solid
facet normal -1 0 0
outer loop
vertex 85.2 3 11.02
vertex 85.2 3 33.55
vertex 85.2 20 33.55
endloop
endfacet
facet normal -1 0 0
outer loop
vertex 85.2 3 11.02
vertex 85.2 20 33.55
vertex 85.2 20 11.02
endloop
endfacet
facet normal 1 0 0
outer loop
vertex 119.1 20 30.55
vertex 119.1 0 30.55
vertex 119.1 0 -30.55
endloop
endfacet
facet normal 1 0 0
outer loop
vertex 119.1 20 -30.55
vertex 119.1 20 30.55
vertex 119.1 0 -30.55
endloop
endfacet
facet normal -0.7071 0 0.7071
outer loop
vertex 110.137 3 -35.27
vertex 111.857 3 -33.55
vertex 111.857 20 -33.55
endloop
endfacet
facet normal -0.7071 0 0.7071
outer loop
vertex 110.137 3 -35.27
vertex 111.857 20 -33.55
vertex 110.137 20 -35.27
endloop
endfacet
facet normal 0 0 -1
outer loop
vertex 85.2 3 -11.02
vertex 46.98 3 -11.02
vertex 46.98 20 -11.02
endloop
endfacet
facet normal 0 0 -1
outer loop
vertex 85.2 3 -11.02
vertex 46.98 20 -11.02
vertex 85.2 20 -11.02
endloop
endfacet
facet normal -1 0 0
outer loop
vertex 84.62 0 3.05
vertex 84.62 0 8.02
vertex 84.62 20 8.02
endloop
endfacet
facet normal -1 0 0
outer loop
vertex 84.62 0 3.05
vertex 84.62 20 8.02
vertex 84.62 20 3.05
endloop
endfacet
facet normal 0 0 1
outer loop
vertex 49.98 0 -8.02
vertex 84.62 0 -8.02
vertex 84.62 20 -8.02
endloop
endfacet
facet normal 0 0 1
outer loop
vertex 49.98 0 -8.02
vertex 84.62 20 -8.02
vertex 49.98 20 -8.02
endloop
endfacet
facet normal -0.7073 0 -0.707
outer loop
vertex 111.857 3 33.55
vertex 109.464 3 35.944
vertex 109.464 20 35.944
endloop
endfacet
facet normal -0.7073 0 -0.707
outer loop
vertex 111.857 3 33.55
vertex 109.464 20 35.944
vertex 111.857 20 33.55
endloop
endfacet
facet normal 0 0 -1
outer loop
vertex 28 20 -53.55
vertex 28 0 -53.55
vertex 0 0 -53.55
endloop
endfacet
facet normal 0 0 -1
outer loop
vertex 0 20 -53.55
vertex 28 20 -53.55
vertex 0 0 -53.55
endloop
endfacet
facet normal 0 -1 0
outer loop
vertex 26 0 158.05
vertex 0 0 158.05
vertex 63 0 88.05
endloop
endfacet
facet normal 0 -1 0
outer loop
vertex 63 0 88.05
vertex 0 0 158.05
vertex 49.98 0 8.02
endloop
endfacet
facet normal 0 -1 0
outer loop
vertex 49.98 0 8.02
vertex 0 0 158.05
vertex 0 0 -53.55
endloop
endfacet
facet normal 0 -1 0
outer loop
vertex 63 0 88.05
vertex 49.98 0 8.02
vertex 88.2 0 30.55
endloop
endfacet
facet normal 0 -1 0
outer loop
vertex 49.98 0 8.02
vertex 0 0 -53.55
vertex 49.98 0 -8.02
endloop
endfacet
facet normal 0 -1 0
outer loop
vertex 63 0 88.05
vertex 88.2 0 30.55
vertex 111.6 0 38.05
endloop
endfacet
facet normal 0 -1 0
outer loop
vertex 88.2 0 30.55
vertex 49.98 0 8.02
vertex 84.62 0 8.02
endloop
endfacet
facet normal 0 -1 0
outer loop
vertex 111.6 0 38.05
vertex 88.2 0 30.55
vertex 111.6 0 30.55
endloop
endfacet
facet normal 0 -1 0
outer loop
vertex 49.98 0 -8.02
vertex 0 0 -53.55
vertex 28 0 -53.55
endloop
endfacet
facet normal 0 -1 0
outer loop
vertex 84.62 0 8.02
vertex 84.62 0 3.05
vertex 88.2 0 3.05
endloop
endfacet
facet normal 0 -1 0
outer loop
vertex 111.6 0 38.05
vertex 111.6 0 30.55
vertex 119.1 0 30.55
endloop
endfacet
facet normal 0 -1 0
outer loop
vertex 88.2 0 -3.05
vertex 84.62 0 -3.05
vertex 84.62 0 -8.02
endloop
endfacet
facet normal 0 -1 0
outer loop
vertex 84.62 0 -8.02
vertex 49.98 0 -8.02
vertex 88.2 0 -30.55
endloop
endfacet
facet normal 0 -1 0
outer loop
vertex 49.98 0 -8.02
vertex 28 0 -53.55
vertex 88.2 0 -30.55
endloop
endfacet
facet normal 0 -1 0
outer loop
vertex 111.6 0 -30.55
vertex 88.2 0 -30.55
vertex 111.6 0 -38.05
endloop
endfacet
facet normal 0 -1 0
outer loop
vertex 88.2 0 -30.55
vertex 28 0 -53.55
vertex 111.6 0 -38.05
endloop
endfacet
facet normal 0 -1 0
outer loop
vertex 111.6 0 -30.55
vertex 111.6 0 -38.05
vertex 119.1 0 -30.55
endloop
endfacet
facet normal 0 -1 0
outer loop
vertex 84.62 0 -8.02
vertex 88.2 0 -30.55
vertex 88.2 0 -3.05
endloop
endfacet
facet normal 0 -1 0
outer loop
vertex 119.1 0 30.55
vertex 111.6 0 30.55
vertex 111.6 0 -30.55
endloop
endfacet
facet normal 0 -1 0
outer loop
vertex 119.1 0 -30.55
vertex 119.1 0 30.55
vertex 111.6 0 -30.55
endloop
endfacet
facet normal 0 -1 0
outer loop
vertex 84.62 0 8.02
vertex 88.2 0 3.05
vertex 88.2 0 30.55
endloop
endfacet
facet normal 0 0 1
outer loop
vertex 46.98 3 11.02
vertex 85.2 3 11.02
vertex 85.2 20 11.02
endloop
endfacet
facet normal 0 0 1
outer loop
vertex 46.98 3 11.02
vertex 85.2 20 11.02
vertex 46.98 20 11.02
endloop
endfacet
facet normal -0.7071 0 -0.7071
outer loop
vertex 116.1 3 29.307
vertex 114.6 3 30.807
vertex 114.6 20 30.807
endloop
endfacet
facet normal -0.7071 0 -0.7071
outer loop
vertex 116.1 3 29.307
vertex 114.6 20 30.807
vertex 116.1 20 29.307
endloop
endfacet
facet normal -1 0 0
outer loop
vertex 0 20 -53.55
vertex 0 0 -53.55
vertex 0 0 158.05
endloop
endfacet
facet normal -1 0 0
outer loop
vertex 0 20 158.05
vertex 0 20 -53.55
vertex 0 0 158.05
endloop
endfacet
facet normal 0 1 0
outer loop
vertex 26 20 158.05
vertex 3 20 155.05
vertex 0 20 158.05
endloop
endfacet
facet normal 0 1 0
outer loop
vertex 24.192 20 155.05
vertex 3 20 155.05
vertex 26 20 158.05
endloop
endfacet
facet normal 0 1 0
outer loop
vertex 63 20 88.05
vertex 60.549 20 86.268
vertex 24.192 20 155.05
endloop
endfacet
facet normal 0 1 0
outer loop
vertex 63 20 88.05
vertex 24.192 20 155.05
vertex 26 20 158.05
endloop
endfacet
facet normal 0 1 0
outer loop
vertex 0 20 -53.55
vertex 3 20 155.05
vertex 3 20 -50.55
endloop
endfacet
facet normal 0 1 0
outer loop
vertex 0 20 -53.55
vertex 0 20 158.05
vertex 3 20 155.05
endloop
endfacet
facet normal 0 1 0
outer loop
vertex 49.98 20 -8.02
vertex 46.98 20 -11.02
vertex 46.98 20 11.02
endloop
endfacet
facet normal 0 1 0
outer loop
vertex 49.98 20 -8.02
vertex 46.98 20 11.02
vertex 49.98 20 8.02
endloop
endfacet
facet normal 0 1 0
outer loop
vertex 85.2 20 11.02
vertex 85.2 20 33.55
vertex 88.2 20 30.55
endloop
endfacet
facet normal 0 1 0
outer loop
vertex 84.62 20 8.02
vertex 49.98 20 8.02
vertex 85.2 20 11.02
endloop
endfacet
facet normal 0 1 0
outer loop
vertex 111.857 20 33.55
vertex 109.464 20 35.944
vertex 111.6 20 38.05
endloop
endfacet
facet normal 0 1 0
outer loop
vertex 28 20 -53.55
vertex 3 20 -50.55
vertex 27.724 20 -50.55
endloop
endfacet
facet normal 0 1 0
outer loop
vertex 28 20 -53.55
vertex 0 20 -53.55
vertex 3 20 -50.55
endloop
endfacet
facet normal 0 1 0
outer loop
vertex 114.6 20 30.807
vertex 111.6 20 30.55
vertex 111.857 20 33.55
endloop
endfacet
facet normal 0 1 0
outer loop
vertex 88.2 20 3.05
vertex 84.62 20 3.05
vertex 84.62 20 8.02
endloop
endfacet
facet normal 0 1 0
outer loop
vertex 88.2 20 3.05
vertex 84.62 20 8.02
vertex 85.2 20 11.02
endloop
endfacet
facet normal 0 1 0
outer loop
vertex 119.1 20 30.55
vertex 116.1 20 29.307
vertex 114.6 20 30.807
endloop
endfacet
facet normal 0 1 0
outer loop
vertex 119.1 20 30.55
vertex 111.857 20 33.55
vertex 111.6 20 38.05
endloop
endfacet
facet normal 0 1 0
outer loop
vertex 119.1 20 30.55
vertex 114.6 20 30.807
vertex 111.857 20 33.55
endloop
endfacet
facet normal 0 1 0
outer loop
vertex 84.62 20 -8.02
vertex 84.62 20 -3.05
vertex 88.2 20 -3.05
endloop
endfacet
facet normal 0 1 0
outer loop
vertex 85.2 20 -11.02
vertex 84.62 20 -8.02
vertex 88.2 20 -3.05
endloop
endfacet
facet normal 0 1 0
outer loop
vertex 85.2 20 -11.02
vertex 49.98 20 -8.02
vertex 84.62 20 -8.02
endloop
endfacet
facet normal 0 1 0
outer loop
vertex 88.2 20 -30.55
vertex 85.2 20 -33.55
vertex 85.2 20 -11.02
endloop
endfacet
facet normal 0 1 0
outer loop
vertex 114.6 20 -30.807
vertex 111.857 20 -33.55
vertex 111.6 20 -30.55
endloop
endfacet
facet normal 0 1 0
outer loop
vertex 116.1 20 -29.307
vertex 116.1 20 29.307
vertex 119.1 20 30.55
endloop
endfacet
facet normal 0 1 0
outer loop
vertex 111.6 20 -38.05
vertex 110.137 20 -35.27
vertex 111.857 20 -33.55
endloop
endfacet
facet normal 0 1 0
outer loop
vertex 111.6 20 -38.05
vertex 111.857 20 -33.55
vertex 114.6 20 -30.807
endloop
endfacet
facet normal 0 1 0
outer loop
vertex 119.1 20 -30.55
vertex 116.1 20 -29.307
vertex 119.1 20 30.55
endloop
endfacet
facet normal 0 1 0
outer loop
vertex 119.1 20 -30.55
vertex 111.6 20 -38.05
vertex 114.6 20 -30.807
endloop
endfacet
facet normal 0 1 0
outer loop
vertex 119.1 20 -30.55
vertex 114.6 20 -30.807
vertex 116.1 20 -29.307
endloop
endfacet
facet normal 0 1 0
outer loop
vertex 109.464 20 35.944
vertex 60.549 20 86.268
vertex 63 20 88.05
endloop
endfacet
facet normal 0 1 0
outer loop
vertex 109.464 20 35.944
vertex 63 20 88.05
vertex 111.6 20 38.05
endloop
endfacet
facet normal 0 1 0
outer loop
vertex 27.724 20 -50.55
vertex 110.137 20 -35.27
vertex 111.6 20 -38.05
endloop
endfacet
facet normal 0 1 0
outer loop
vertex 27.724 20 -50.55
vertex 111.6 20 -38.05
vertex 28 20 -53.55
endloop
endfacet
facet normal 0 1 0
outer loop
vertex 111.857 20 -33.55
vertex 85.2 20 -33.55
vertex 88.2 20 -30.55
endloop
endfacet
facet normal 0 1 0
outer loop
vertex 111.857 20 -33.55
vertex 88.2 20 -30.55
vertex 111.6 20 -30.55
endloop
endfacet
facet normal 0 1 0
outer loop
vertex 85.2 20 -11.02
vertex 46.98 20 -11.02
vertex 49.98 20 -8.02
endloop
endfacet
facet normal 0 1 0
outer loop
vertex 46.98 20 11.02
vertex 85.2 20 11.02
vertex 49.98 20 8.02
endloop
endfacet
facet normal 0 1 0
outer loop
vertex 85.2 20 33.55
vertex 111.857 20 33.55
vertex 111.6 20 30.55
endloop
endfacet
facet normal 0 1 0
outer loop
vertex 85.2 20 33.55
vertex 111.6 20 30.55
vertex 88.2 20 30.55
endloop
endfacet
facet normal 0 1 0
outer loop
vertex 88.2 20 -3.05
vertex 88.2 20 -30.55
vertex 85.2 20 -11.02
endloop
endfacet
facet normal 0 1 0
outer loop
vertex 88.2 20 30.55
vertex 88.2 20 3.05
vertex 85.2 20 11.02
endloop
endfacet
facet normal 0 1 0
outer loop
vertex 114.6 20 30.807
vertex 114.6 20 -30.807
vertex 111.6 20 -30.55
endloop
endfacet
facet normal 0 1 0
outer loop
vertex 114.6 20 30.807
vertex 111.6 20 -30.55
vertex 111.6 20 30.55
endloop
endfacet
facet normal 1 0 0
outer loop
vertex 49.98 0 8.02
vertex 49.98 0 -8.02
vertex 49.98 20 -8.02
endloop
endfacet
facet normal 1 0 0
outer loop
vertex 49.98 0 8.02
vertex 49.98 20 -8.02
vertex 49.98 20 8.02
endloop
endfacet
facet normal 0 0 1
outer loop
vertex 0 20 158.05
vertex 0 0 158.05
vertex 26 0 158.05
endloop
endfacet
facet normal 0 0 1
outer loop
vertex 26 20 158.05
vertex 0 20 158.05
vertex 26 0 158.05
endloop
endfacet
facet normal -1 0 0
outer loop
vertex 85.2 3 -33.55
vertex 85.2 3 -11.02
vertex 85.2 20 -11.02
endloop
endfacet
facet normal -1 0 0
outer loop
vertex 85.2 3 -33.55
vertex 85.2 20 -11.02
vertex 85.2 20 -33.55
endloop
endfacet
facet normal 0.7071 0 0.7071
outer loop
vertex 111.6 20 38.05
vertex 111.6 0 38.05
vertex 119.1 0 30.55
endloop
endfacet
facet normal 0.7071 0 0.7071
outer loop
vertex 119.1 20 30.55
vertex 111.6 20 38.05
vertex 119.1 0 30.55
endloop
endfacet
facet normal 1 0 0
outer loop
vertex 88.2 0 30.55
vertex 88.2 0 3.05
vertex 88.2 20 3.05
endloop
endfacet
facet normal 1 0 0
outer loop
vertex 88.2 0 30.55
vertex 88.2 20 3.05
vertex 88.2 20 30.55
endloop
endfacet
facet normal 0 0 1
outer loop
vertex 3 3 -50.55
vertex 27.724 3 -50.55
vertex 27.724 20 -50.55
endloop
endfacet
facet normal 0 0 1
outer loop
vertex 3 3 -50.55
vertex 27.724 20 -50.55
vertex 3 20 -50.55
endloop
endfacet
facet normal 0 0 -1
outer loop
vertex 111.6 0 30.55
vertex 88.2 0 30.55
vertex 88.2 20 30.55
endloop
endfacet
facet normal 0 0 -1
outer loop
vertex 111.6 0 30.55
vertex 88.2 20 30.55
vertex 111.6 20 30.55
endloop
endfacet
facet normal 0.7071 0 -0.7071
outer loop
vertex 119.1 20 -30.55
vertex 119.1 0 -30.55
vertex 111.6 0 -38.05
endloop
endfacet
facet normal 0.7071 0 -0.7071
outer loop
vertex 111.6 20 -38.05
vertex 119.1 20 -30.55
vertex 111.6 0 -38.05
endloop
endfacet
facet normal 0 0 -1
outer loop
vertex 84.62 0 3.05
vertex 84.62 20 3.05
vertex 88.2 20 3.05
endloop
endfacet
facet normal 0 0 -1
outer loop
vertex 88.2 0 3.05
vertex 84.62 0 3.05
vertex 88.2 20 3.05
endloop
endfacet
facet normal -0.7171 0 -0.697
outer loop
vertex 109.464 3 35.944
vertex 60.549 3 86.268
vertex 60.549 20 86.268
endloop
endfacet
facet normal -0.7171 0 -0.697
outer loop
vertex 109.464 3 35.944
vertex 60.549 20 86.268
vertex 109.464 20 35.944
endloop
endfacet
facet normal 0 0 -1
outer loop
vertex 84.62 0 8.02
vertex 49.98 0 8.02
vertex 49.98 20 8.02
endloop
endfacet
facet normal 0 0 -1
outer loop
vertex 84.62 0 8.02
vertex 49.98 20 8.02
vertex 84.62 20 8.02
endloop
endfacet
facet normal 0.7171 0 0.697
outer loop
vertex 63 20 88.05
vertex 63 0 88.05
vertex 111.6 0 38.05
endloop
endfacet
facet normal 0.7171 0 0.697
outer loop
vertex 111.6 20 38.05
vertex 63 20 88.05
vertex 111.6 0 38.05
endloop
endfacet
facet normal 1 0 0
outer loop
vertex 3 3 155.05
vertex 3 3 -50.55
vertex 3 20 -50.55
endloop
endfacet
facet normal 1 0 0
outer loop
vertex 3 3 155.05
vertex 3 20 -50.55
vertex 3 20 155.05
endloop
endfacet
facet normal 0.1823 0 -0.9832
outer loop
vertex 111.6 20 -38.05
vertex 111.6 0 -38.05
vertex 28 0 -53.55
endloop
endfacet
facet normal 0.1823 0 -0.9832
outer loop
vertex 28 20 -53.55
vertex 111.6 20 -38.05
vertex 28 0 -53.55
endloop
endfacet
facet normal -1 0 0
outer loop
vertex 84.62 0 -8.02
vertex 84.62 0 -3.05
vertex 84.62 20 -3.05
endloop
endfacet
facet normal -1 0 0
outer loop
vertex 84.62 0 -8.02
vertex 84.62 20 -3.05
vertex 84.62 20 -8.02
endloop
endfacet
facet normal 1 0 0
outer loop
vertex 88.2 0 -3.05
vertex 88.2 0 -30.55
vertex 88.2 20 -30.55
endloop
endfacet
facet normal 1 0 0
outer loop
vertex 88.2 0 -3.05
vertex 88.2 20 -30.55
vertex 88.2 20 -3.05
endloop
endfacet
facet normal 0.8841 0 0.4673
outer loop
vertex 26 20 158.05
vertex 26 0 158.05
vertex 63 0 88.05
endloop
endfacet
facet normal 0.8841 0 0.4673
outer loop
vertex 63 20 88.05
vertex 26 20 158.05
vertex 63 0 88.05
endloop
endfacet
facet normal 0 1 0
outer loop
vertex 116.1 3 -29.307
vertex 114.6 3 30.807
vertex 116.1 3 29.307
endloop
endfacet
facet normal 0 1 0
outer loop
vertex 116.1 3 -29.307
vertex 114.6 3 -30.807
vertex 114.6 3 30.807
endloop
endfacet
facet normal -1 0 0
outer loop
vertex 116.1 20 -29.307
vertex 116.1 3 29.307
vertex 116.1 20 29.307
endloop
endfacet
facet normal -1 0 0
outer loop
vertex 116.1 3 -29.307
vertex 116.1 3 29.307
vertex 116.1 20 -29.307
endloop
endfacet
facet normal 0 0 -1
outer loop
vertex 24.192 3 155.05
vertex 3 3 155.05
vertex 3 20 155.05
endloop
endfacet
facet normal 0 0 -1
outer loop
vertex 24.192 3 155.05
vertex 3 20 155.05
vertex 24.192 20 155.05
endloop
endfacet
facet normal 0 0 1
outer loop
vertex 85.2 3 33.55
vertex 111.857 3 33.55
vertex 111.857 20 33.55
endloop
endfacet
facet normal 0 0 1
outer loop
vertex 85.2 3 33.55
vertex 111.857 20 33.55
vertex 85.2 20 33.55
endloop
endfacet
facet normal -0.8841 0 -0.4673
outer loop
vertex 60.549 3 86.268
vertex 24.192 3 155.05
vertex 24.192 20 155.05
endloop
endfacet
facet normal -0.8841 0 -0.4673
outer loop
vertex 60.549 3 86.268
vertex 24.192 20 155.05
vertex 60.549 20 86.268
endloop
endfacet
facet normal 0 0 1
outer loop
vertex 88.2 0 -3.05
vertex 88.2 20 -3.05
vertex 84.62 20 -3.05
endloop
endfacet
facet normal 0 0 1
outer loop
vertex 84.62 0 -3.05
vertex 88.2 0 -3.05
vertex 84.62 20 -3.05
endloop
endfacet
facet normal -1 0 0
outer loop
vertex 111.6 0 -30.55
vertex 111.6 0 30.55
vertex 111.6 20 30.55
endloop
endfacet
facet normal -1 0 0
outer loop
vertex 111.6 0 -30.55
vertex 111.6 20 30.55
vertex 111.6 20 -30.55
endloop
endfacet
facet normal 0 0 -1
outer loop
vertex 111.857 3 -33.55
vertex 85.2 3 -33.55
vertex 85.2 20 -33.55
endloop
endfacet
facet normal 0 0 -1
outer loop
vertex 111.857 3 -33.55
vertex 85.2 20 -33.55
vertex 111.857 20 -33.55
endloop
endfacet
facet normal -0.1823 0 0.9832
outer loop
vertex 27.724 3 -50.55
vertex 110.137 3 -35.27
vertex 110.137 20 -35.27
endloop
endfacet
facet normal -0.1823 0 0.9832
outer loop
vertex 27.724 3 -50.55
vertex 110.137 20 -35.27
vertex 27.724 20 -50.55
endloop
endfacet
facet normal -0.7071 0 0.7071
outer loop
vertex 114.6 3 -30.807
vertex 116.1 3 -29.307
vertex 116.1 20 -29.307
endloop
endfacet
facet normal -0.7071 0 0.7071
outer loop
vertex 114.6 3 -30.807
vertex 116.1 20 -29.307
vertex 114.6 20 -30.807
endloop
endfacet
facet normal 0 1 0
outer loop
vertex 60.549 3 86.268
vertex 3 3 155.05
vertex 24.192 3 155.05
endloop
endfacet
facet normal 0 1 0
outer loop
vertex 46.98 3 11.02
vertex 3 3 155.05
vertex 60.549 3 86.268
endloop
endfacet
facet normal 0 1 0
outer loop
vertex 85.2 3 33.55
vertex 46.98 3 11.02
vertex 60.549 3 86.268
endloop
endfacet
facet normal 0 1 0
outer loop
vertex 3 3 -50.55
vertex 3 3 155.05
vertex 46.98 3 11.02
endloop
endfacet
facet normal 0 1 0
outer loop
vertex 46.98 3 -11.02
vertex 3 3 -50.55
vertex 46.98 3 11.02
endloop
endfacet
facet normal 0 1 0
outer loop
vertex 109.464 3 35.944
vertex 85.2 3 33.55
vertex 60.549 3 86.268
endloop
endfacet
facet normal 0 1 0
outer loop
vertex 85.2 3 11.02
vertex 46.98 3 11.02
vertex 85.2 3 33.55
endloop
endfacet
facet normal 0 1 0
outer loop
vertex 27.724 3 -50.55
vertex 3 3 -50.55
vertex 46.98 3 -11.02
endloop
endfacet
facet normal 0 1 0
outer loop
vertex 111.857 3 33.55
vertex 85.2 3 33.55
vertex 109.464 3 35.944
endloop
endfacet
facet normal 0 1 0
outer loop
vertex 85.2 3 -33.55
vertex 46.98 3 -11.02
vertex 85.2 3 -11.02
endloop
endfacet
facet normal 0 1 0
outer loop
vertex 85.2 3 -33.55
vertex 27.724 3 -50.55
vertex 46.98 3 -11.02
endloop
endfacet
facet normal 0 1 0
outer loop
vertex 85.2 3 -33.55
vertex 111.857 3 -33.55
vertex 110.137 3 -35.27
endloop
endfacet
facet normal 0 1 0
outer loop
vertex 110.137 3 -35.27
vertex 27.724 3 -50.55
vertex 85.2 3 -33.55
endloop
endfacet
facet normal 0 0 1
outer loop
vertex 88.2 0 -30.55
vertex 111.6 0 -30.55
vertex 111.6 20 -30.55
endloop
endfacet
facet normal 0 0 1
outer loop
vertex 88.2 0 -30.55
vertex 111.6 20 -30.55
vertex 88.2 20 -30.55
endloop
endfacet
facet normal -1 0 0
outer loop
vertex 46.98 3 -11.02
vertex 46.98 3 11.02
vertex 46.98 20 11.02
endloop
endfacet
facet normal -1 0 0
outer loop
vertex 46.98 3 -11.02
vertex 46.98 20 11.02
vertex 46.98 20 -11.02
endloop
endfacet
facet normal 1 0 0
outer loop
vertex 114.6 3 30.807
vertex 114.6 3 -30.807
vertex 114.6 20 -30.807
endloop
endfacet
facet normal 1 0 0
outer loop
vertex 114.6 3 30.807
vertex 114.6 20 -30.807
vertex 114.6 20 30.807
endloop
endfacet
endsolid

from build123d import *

# Parameters (mm, degrees)
BOSS_EXTRUDE2_DEPTH = 20
SHELL1_START        = 3
SHELL1_DEPTH        = 17


# Read off the part's stored shape, not the designer's step: Shell1
with BuildPart() as part:
    # Sketch1 → Boss-Extrude2 (new body)
    with BuildSketch(Plane(origin=(0, 0, 0), x_dir=(1, 0, 0), z_dir=(0, 1, 0))):
        Polygon((111.6, 38.05), (28, 53.55), (0, 53.55), (0, -158.05), (26, -158.05), (63, -88.05), (111.6, -38.05), (119.1, -30.55), (119.1, 30.55), align=None)
        Polygon((84.62, 3.05), (84.62, 8.02), (49.98, 8.02), (49.98, -8.02), (84.62, -8.02), (84.62, -3.05), (88.2, -3.05), (88.2, -30.55), (111.6, -30.55), (111.6, 30.55), (88.2, 30.55), (88.2, 3.05), align=None, mode=Mode.SUBTRACT)
    extrude(amount=BOSS_EXTRUDE2_DEPTH)

    # Shell1 outline → Shell1 (cut)
    with BuildSketch(Plane(origin=(0, 0, 0), x_dir=(1, 0, 0), z_dir=(0, 1, 0)).offset(SHELL1_START)):
        Polygon((114.6, -30.807359313), (116.1, -29.307359313), (116.1, 29.307359313), (114.6, 30.807359313), align=None)
        Polygon((109.463620332, -35.943738981), (111.857359313, -33.55), (85.2, -33.55), (85.2, -11.02), (46.98, -11.02), (46.98, 11.02), (85.2, 11.02), (85.2, 33.55), (111.857359313, 33.55), (110.13729107, 35.270068243), (27.724239787, 50.55), (3, 50.55), (3, -155.05), (24.192413563, -155.05), (60.548822095, -86.26760548), align=None)
    extrude(amount=SHELL1_DEPTH, mode=Mode.SUBTRACT)


solid = part.part
